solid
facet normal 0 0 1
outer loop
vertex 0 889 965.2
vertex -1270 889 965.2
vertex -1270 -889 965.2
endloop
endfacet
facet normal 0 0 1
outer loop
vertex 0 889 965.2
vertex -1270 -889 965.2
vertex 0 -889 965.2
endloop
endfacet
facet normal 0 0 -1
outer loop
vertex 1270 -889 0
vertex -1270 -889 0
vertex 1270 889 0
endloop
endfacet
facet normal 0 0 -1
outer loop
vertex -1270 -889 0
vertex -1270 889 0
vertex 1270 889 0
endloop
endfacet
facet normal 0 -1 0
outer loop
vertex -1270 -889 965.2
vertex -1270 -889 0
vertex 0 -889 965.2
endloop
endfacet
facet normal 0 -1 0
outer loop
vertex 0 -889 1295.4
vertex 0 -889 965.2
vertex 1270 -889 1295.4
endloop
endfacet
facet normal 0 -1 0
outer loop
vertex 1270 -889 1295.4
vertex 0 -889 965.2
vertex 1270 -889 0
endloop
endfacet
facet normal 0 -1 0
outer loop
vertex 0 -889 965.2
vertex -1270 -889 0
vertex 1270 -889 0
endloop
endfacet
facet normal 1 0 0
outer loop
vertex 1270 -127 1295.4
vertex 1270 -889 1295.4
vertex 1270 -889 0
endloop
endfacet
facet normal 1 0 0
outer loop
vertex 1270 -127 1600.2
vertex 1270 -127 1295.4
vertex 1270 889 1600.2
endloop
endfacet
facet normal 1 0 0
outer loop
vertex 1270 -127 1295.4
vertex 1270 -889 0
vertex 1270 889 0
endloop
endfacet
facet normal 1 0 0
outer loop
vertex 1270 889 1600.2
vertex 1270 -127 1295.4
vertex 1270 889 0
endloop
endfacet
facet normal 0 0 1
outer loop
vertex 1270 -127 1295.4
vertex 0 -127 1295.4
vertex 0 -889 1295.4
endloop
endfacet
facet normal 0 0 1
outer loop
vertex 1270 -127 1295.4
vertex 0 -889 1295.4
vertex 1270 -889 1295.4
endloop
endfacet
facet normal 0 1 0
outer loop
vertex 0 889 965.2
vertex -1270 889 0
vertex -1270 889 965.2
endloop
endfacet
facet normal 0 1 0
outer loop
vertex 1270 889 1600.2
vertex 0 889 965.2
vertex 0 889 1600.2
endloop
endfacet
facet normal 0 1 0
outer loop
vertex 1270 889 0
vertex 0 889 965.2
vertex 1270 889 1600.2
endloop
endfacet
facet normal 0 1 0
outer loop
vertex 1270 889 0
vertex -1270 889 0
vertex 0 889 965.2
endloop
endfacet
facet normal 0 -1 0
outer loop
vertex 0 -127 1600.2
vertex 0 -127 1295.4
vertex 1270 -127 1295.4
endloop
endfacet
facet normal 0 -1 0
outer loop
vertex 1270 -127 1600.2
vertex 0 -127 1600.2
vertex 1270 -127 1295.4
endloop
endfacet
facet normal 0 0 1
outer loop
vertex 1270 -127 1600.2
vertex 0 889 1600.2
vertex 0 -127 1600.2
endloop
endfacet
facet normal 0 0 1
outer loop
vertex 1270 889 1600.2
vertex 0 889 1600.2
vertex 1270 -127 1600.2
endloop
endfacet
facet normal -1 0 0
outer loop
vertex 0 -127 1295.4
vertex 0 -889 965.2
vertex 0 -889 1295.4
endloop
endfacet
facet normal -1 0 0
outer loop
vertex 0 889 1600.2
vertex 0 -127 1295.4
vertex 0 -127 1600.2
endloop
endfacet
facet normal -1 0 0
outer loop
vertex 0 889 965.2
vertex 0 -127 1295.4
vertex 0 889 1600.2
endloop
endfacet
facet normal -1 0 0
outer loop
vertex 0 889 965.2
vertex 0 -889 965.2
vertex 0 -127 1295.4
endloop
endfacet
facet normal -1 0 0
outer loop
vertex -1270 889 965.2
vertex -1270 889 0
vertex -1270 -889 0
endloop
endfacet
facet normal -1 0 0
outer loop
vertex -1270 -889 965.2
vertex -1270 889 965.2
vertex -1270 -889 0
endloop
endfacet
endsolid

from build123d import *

# Parameters (mm, degrees)
F1_DEPTH = 965.2
F2_W     = 1270
F2_H     = 1778
F3_DEPTH = 330.2
F4_W     = 1270
F4_H     = 1016
F5_DEPTH = 304.8


with BuildPart() as f1:
    # F0 (on Top) → F1 (new body)
    with BuildSketch(Plane.XY):
        Polygon((-1270, -889), (0, -889), (1270, -889), (1270, 889), (-1016, 889), (-1270, 889), align=None)
    extrude(amount=F1_DEPTH)

    # F2 (on face) → F3 (join)
    with BuildSketch(Plane.XY.offset(965.2)):
        with Locations((635, 0)):
            Rectangle(F2_W, F2_H)
    extrude(amount=F3_DEPTH)

    # F4 (on face) → F5 (join)
    with BuildSketch(Plane.XY.offset(1295.4)):
        with Locations((635, 381)):
            Rectangle(F4_W, F4_H)
    extrude(amount=F5_DEPTH)


solid = f1.part
